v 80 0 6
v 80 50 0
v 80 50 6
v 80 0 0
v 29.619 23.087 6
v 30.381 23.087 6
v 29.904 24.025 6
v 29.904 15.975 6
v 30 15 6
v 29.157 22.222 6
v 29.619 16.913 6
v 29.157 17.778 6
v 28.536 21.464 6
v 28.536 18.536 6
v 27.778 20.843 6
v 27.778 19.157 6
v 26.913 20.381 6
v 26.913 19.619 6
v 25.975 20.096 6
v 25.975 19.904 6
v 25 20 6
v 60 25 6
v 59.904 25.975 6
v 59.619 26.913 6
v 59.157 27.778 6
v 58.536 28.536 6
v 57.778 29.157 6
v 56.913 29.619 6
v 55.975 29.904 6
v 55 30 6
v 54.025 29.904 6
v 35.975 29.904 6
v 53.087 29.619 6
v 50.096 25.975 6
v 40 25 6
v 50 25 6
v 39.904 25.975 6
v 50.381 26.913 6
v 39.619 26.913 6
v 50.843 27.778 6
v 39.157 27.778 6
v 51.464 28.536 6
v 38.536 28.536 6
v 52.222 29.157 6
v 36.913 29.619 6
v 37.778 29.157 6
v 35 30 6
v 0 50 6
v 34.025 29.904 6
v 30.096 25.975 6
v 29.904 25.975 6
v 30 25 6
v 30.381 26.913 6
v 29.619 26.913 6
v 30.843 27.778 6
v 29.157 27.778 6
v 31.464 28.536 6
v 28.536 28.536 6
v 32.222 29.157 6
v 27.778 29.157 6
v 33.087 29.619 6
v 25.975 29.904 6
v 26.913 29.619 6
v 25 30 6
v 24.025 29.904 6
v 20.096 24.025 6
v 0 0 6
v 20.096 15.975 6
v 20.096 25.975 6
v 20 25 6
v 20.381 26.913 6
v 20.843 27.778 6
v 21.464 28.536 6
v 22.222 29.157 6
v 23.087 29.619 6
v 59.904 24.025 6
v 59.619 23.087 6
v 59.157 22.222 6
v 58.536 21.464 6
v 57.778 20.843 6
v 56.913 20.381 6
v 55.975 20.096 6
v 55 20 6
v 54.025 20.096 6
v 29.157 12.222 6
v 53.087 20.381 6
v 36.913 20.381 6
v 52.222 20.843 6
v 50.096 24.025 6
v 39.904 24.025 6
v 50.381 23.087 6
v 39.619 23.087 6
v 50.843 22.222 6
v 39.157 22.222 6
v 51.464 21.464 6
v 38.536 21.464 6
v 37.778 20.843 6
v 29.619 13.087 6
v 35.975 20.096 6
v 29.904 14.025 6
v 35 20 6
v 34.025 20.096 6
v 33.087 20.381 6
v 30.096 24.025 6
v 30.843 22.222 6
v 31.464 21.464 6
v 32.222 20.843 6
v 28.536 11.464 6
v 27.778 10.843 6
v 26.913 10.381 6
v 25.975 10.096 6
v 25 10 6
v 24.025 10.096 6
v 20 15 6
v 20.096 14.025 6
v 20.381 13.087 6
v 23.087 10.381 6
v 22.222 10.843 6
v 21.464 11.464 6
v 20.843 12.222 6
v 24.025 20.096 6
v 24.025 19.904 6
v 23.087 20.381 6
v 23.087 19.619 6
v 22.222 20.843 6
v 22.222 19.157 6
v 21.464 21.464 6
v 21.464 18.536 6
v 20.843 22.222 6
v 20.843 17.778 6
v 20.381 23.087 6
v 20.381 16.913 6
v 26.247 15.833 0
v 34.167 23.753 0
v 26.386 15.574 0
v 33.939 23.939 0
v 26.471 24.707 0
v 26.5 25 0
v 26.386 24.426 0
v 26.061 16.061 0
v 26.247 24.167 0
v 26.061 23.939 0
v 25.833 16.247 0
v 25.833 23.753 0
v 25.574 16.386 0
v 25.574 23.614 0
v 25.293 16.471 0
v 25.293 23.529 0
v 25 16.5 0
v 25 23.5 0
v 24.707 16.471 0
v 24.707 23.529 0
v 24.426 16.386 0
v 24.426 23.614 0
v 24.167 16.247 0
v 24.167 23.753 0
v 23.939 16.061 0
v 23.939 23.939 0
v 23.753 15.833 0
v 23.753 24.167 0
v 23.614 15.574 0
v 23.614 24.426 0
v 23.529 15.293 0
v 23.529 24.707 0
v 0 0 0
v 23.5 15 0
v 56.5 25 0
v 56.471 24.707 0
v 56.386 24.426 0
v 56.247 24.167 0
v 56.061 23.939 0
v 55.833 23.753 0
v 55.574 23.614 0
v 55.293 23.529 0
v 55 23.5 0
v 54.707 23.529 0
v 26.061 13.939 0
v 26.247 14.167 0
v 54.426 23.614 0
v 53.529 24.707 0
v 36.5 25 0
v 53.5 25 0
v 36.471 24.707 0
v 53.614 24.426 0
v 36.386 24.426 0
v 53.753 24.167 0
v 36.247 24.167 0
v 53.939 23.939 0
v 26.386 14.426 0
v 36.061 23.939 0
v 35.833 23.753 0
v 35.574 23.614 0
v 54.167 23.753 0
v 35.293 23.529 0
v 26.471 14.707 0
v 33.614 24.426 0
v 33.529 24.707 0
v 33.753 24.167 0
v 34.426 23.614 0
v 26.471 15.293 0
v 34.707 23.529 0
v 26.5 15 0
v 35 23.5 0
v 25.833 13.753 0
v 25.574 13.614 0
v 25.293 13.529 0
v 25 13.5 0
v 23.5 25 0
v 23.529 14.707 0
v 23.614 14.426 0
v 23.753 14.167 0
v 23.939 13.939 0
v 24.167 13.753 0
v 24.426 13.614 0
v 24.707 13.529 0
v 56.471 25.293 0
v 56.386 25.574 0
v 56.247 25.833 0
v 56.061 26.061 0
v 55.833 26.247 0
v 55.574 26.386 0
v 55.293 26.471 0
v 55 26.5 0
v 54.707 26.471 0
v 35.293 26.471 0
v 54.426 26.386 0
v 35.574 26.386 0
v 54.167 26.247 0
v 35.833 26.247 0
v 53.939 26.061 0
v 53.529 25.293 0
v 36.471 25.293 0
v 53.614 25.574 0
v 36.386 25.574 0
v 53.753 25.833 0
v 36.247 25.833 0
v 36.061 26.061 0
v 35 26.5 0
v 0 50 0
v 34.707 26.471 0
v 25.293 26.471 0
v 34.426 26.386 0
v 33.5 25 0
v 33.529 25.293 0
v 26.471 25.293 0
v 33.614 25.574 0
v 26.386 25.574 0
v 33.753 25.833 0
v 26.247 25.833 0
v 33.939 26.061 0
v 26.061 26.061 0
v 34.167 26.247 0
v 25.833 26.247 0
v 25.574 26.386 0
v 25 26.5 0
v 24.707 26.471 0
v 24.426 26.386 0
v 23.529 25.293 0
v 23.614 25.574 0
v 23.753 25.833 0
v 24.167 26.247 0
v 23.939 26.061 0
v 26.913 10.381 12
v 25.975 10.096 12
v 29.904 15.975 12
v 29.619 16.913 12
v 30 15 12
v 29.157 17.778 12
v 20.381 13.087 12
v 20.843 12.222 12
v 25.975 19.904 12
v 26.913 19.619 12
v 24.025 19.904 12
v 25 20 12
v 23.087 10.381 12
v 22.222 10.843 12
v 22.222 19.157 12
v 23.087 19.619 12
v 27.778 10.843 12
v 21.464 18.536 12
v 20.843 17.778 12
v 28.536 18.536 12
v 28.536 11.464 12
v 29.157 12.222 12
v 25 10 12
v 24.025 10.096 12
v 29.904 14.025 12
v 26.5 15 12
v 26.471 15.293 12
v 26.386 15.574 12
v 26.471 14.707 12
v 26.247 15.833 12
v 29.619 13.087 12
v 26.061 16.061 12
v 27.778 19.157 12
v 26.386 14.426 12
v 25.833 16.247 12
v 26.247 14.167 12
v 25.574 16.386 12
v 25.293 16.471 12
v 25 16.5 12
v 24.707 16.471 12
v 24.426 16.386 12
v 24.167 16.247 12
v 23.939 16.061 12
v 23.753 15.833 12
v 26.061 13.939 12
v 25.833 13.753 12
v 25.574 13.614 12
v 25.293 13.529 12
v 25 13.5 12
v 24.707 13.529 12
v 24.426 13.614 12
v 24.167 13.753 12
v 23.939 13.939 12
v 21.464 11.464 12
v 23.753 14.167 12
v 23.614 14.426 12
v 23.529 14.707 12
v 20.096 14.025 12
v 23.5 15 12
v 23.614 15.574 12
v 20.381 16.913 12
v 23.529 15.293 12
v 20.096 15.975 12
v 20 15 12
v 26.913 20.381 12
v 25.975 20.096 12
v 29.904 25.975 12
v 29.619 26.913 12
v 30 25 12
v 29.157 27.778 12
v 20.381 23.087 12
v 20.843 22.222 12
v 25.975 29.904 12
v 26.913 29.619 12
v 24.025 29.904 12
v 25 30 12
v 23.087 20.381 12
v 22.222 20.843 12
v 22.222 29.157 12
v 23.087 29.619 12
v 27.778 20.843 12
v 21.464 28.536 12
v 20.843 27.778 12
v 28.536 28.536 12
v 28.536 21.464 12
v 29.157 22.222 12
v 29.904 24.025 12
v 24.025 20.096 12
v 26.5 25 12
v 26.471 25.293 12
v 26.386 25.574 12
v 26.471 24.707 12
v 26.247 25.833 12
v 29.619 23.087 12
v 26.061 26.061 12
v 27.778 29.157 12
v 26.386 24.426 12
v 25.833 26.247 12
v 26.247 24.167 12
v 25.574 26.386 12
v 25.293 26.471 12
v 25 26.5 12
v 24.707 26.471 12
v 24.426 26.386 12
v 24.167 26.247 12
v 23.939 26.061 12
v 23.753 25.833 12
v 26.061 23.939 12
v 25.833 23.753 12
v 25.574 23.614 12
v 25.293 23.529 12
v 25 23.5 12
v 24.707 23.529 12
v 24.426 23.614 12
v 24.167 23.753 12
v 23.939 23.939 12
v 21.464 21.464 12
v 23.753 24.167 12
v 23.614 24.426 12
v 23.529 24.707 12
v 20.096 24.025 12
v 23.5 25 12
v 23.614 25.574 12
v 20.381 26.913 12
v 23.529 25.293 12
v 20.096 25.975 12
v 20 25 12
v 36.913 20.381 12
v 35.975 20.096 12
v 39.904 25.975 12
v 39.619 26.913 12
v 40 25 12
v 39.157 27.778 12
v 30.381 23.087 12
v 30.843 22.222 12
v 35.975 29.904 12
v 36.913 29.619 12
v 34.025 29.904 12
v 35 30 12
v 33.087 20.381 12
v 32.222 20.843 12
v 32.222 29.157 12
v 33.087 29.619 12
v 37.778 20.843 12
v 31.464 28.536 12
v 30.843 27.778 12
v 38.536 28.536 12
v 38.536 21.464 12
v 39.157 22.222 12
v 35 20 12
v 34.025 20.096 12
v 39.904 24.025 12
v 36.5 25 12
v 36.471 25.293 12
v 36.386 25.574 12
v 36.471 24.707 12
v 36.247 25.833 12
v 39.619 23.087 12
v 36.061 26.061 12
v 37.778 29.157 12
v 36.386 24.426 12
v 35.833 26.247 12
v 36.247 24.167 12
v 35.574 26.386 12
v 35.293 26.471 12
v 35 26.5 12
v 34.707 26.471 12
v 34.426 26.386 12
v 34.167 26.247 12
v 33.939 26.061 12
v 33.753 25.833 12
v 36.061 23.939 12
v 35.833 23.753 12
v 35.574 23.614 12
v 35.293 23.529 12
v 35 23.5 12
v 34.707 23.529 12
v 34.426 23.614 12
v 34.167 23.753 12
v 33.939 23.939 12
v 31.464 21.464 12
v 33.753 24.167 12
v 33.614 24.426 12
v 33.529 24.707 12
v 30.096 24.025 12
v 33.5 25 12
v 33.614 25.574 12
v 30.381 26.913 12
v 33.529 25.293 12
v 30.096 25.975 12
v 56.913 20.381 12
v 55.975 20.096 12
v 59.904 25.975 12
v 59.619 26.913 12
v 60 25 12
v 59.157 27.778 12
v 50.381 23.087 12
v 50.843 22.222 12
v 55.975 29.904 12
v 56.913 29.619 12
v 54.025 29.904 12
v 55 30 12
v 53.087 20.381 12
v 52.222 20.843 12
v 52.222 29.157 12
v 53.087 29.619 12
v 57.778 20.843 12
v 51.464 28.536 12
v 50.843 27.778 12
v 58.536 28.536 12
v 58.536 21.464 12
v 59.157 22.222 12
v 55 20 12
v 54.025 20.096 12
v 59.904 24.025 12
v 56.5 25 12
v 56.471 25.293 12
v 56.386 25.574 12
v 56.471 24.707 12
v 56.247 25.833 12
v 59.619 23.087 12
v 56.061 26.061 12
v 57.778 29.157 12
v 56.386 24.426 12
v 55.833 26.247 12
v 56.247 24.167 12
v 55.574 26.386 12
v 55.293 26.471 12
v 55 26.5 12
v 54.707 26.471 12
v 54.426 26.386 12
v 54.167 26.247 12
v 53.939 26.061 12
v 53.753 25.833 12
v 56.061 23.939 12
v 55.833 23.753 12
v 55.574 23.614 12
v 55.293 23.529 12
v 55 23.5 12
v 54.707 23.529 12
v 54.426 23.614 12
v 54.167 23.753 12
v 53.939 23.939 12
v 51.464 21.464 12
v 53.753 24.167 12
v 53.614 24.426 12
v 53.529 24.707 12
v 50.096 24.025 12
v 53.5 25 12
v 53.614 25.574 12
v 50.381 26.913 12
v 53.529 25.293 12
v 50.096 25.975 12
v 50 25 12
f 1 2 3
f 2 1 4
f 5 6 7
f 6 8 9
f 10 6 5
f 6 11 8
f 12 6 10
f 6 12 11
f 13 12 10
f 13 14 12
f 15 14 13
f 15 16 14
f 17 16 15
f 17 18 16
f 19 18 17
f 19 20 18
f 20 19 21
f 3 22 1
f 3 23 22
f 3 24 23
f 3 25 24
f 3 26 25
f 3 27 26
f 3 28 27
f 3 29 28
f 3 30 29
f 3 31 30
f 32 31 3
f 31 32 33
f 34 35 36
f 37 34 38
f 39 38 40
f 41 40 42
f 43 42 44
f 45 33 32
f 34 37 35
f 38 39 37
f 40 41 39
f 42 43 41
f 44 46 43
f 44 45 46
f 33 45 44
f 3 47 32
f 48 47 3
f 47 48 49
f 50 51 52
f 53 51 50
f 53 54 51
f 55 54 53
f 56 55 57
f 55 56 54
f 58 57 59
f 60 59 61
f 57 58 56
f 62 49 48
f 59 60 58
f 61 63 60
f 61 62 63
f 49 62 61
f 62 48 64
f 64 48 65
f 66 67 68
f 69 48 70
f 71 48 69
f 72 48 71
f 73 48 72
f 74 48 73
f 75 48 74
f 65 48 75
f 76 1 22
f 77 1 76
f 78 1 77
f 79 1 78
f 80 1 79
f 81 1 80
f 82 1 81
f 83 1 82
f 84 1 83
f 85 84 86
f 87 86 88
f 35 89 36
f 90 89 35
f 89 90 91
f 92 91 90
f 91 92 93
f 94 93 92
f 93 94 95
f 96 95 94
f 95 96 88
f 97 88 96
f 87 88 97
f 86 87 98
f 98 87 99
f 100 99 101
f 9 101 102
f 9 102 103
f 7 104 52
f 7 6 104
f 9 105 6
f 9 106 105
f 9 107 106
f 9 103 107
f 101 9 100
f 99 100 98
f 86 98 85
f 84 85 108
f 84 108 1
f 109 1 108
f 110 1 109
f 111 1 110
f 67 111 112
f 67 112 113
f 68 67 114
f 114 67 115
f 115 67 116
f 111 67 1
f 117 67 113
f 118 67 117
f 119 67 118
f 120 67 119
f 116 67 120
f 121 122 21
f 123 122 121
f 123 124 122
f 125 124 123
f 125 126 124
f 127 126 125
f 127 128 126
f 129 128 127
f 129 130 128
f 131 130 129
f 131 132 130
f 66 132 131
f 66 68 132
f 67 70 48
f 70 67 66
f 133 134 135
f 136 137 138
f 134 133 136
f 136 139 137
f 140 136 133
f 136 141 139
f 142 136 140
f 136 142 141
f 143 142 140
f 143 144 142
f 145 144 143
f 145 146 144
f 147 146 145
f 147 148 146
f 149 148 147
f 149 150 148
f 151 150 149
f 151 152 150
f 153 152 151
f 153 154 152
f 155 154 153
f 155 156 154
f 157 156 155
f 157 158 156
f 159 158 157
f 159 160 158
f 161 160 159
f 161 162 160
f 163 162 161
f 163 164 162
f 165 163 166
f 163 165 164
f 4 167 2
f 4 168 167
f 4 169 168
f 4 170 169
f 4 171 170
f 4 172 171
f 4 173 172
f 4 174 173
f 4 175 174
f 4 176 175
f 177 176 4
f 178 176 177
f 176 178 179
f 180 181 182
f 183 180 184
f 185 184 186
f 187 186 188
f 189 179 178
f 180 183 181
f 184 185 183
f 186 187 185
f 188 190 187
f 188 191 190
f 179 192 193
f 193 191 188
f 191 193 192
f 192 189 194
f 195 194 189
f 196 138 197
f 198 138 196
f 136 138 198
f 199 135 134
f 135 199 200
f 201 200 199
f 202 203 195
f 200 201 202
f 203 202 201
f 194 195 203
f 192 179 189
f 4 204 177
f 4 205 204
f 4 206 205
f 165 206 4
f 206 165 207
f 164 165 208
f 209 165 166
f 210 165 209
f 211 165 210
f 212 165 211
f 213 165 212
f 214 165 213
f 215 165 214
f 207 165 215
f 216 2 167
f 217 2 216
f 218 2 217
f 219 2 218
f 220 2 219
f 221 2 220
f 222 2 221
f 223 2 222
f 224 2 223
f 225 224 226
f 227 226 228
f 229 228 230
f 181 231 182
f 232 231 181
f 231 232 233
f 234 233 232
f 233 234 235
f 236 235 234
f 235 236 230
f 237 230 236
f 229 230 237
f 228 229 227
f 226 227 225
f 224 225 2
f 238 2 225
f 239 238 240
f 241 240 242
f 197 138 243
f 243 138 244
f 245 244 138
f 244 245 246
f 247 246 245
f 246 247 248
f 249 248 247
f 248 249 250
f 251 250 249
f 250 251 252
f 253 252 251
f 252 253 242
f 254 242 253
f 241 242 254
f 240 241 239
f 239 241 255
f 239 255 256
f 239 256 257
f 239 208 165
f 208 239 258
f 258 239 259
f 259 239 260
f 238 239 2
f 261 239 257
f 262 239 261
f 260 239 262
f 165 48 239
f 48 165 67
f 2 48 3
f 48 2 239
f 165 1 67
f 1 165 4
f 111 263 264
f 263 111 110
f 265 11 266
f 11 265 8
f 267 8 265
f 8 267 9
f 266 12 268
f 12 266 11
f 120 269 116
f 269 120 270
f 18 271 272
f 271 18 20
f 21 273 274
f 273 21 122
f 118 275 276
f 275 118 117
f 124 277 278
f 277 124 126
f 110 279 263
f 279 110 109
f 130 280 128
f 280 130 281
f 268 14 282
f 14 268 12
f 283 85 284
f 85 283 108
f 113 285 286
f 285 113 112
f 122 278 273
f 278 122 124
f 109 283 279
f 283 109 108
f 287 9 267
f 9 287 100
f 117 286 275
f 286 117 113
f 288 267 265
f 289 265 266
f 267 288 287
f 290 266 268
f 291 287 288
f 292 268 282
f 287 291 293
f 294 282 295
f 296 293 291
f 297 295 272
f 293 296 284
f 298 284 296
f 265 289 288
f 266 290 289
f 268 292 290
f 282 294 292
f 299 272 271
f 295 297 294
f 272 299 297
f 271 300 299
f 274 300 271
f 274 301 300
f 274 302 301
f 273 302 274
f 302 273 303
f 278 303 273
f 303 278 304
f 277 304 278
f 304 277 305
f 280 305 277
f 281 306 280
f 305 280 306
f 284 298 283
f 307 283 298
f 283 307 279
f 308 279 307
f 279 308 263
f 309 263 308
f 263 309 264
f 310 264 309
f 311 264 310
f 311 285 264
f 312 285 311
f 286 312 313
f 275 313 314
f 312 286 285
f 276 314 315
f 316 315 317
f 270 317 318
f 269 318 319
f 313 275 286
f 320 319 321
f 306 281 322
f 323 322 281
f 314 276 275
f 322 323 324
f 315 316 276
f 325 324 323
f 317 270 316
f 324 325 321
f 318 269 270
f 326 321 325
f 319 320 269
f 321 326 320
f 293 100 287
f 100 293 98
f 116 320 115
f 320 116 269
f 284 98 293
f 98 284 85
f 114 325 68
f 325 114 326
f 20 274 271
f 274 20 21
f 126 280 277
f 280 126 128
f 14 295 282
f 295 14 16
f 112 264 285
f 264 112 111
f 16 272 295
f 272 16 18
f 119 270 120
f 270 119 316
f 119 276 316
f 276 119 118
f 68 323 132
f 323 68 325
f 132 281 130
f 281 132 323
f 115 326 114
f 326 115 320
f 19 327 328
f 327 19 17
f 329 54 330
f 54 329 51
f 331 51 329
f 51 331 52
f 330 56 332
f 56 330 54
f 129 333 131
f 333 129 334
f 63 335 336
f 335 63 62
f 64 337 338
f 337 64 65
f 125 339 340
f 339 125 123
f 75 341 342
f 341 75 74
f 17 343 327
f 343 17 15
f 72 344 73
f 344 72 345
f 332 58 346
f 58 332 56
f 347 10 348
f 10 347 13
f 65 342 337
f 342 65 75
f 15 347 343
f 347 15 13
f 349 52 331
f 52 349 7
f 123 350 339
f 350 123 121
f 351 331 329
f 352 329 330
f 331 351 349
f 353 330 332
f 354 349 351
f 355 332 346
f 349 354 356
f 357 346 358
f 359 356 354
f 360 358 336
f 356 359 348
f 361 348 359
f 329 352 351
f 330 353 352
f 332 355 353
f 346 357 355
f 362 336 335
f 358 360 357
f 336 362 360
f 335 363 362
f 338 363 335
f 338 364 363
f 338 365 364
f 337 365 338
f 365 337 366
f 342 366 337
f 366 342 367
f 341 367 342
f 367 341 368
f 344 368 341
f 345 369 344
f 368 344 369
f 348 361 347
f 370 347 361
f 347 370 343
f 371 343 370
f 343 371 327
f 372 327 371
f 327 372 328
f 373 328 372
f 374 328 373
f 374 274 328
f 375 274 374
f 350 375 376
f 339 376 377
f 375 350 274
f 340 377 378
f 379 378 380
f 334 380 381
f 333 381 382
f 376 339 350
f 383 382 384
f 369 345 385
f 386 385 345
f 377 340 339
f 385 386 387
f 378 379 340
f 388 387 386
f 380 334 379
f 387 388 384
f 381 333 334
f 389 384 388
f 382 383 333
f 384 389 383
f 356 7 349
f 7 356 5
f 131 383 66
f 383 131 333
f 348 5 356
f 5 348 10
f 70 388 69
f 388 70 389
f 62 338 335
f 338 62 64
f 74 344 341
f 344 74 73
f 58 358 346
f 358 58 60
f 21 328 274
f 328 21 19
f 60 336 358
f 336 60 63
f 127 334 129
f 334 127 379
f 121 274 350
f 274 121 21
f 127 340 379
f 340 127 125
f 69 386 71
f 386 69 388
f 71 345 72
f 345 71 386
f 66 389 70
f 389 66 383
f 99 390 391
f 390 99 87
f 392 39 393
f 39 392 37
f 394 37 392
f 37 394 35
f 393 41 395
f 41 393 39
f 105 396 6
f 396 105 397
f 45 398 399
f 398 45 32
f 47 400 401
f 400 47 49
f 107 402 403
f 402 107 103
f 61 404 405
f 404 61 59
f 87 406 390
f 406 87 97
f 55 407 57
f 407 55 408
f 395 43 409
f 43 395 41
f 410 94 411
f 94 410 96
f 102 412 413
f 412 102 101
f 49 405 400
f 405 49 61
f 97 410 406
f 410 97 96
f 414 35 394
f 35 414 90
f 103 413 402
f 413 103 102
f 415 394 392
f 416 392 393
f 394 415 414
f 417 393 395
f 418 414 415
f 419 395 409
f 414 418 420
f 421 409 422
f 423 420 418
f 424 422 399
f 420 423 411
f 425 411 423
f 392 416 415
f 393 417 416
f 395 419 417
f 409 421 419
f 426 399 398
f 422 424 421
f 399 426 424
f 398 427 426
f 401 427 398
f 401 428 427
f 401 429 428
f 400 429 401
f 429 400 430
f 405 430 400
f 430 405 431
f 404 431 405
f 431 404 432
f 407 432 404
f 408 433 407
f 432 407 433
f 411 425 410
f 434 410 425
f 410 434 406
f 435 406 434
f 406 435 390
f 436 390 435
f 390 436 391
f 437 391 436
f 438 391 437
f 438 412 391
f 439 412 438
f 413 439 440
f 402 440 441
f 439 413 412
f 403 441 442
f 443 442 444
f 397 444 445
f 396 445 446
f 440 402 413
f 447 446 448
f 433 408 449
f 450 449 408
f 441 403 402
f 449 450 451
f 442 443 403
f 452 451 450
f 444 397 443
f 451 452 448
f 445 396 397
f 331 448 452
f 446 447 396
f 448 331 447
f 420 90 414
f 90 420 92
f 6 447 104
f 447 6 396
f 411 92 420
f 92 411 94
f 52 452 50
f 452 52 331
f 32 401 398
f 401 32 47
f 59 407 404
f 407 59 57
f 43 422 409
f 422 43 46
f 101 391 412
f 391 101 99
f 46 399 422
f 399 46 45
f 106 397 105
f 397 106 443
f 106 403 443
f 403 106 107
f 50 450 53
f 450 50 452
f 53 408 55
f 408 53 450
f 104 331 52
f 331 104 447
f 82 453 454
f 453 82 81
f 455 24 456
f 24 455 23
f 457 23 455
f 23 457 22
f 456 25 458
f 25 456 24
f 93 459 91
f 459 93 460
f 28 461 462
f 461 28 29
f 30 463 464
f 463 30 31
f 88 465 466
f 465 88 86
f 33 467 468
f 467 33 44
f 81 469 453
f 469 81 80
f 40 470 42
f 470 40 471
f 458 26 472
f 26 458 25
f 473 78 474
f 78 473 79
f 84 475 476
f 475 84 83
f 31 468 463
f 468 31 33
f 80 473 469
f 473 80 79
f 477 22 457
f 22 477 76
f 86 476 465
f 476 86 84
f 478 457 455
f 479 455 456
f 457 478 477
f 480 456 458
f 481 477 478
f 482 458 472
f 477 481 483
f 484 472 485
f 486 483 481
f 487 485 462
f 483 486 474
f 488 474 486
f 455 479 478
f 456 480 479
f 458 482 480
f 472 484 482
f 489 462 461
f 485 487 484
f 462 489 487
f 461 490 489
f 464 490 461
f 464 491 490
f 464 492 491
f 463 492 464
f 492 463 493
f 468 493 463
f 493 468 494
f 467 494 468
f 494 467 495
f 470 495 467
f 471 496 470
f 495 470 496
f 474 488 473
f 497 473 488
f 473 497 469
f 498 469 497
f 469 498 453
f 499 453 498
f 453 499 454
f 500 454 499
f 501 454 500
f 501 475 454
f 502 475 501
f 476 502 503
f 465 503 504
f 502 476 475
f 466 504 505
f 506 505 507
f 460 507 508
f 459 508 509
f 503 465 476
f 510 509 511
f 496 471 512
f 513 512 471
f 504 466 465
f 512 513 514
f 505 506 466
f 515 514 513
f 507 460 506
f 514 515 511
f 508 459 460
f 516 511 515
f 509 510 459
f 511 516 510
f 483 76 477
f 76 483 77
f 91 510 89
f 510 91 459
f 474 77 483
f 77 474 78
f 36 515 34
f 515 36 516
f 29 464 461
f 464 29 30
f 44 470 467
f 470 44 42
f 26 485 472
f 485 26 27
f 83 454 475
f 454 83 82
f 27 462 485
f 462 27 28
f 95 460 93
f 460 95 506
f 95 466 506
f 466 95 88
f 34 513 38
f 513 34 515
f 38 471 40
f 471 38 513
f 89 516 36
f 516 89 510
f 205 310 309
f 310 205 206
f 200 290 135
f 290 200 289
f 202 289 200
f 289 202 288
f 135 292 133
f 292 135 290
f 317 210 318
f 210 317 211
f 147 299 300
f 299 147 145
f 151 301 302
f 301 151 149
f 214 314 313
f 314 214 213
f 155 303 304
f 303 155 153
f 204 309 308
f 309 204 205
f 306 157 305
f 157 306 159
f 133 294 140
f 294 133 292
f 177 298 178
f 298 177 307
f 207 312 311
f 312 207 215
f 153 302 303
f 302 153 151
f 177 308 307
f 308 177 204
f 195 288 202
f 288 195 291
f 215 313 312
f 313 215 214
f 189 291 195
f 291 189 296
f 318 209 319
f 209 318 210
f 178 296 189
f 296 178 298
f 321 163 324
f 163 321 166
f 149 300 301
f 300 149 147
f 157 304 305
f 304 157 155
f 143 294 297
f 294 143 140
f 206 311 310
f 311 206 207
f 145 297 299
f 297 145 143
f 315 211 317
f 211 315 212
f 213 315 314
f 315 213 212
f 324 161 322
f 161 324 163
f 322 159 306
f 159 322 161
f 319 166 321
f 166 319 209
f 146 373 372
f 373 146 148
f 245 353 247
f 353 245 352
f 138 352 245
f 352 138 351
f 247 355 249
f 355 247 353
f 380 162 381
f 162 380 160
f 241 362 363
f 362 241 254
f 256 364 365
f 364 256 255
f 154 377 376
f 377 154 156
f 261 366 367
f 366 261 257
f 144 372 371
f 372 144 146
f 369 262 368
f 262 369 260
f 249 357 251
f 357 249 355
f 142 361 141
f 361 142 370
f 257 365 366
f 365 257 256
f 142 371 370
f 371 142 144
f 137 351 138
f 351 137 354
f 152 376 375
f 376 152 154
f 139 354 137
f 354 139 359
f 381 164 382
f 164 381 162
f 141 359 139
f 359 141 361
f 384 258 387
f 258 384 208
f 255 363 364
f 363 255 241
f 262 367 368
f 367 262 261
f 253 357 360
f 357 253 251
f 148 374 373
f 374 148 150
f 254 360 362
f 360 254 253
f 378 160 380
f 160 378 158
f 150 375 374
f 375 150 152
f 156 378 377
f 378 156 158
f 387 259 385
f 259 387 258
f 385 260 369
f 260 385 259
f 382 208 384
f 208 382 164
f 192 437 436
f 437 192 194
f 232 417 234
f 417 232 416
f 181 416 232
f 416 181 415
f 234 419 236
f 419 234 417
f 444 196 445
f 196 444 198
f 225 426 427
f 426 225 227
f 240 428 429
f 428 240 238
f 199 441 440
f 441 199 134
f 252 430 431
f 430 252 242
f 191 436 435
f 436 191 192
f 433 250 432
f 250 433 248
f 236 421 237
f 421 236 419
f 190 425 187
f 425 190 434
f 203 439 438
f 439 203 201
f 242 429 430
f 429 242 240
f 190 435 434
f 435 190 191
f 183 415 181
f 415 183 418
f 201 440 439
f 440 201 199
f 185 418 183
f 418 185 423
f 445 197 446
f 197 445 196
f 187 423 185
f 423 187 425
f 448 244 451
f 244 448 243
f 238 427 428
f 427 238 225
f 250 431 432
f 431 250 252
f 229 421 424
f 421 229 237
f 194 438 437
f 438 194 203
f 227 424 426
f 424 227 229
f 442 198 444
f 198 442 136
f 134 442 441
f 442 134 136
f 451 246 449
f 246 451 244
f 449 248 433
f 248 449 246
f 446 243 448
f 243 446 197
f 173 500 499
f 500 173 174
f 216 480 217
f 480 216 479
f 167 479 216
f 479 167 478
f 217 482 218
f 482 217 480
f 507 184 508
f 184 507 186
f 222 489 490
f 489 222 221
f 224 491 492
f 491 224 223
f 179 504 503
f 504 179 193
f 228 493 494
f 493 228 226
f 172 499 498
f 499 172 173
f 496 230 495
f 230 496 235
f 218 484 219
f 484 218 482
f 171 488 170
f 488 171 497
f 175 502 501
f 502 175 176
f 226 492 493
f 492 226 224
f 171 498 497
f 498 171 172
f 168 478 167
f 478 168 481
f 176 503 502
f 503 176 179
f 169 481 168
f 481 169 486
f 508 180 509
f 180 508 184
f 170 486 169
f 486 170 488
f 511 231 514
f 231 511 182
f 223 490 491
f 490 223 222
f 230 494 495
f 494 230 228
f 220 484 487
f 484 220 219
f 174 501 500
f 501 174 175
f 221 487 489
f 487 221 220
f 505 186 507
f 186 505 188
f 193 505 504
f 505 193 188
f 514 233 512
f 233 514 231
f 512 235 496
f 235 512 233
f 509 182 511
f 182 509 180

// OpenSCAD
$fn = 32;

// ----------------------------------------------------------------------
// Boss field: plate with bosses at given coordinates
// ----------------------------------------------------------------------

// --- parameters (mm) ---
plate_l = 80;             // plate length, X
plate_w = 50;             // plate width, Y
plate_t = 6;              // plate thickness, Z
boss_d = 10;              // boss diameter
boss_h = 6;               // boss height above the plate
bore_d = 3;               // boss bore

total_h = plate_t + boss_h;  // overall height

difference() {
  union() {
    cube([plate_l, plate_w, plate_t]);
    translate([25, 15, plate_t]) cylinder(h = boss_h, d = boss_d);
    translate([25, 25, plate_t]) cylinder(h = boss_h, d = boss_d);
    translate([35, 25, plate_t]) cylinder(h = boss_h, d = boss_d);
    translate([55, 25, plate_t]) cylinder(h = boss_h, d = boss_d);
  }
  translate([25, 15, -1]) cylinder(h = total_h + 2, d = bore_d);
  translate([25, 25, -1]) cylinder(h = total_h + 2, d = bore_d);
  translate([35, 25, -1]) cylinder(h = total_h + 2, d = bore_d);
  translate([55, 25, -1]) cylinder(h = total_h + 2, d = bore_d);
}
